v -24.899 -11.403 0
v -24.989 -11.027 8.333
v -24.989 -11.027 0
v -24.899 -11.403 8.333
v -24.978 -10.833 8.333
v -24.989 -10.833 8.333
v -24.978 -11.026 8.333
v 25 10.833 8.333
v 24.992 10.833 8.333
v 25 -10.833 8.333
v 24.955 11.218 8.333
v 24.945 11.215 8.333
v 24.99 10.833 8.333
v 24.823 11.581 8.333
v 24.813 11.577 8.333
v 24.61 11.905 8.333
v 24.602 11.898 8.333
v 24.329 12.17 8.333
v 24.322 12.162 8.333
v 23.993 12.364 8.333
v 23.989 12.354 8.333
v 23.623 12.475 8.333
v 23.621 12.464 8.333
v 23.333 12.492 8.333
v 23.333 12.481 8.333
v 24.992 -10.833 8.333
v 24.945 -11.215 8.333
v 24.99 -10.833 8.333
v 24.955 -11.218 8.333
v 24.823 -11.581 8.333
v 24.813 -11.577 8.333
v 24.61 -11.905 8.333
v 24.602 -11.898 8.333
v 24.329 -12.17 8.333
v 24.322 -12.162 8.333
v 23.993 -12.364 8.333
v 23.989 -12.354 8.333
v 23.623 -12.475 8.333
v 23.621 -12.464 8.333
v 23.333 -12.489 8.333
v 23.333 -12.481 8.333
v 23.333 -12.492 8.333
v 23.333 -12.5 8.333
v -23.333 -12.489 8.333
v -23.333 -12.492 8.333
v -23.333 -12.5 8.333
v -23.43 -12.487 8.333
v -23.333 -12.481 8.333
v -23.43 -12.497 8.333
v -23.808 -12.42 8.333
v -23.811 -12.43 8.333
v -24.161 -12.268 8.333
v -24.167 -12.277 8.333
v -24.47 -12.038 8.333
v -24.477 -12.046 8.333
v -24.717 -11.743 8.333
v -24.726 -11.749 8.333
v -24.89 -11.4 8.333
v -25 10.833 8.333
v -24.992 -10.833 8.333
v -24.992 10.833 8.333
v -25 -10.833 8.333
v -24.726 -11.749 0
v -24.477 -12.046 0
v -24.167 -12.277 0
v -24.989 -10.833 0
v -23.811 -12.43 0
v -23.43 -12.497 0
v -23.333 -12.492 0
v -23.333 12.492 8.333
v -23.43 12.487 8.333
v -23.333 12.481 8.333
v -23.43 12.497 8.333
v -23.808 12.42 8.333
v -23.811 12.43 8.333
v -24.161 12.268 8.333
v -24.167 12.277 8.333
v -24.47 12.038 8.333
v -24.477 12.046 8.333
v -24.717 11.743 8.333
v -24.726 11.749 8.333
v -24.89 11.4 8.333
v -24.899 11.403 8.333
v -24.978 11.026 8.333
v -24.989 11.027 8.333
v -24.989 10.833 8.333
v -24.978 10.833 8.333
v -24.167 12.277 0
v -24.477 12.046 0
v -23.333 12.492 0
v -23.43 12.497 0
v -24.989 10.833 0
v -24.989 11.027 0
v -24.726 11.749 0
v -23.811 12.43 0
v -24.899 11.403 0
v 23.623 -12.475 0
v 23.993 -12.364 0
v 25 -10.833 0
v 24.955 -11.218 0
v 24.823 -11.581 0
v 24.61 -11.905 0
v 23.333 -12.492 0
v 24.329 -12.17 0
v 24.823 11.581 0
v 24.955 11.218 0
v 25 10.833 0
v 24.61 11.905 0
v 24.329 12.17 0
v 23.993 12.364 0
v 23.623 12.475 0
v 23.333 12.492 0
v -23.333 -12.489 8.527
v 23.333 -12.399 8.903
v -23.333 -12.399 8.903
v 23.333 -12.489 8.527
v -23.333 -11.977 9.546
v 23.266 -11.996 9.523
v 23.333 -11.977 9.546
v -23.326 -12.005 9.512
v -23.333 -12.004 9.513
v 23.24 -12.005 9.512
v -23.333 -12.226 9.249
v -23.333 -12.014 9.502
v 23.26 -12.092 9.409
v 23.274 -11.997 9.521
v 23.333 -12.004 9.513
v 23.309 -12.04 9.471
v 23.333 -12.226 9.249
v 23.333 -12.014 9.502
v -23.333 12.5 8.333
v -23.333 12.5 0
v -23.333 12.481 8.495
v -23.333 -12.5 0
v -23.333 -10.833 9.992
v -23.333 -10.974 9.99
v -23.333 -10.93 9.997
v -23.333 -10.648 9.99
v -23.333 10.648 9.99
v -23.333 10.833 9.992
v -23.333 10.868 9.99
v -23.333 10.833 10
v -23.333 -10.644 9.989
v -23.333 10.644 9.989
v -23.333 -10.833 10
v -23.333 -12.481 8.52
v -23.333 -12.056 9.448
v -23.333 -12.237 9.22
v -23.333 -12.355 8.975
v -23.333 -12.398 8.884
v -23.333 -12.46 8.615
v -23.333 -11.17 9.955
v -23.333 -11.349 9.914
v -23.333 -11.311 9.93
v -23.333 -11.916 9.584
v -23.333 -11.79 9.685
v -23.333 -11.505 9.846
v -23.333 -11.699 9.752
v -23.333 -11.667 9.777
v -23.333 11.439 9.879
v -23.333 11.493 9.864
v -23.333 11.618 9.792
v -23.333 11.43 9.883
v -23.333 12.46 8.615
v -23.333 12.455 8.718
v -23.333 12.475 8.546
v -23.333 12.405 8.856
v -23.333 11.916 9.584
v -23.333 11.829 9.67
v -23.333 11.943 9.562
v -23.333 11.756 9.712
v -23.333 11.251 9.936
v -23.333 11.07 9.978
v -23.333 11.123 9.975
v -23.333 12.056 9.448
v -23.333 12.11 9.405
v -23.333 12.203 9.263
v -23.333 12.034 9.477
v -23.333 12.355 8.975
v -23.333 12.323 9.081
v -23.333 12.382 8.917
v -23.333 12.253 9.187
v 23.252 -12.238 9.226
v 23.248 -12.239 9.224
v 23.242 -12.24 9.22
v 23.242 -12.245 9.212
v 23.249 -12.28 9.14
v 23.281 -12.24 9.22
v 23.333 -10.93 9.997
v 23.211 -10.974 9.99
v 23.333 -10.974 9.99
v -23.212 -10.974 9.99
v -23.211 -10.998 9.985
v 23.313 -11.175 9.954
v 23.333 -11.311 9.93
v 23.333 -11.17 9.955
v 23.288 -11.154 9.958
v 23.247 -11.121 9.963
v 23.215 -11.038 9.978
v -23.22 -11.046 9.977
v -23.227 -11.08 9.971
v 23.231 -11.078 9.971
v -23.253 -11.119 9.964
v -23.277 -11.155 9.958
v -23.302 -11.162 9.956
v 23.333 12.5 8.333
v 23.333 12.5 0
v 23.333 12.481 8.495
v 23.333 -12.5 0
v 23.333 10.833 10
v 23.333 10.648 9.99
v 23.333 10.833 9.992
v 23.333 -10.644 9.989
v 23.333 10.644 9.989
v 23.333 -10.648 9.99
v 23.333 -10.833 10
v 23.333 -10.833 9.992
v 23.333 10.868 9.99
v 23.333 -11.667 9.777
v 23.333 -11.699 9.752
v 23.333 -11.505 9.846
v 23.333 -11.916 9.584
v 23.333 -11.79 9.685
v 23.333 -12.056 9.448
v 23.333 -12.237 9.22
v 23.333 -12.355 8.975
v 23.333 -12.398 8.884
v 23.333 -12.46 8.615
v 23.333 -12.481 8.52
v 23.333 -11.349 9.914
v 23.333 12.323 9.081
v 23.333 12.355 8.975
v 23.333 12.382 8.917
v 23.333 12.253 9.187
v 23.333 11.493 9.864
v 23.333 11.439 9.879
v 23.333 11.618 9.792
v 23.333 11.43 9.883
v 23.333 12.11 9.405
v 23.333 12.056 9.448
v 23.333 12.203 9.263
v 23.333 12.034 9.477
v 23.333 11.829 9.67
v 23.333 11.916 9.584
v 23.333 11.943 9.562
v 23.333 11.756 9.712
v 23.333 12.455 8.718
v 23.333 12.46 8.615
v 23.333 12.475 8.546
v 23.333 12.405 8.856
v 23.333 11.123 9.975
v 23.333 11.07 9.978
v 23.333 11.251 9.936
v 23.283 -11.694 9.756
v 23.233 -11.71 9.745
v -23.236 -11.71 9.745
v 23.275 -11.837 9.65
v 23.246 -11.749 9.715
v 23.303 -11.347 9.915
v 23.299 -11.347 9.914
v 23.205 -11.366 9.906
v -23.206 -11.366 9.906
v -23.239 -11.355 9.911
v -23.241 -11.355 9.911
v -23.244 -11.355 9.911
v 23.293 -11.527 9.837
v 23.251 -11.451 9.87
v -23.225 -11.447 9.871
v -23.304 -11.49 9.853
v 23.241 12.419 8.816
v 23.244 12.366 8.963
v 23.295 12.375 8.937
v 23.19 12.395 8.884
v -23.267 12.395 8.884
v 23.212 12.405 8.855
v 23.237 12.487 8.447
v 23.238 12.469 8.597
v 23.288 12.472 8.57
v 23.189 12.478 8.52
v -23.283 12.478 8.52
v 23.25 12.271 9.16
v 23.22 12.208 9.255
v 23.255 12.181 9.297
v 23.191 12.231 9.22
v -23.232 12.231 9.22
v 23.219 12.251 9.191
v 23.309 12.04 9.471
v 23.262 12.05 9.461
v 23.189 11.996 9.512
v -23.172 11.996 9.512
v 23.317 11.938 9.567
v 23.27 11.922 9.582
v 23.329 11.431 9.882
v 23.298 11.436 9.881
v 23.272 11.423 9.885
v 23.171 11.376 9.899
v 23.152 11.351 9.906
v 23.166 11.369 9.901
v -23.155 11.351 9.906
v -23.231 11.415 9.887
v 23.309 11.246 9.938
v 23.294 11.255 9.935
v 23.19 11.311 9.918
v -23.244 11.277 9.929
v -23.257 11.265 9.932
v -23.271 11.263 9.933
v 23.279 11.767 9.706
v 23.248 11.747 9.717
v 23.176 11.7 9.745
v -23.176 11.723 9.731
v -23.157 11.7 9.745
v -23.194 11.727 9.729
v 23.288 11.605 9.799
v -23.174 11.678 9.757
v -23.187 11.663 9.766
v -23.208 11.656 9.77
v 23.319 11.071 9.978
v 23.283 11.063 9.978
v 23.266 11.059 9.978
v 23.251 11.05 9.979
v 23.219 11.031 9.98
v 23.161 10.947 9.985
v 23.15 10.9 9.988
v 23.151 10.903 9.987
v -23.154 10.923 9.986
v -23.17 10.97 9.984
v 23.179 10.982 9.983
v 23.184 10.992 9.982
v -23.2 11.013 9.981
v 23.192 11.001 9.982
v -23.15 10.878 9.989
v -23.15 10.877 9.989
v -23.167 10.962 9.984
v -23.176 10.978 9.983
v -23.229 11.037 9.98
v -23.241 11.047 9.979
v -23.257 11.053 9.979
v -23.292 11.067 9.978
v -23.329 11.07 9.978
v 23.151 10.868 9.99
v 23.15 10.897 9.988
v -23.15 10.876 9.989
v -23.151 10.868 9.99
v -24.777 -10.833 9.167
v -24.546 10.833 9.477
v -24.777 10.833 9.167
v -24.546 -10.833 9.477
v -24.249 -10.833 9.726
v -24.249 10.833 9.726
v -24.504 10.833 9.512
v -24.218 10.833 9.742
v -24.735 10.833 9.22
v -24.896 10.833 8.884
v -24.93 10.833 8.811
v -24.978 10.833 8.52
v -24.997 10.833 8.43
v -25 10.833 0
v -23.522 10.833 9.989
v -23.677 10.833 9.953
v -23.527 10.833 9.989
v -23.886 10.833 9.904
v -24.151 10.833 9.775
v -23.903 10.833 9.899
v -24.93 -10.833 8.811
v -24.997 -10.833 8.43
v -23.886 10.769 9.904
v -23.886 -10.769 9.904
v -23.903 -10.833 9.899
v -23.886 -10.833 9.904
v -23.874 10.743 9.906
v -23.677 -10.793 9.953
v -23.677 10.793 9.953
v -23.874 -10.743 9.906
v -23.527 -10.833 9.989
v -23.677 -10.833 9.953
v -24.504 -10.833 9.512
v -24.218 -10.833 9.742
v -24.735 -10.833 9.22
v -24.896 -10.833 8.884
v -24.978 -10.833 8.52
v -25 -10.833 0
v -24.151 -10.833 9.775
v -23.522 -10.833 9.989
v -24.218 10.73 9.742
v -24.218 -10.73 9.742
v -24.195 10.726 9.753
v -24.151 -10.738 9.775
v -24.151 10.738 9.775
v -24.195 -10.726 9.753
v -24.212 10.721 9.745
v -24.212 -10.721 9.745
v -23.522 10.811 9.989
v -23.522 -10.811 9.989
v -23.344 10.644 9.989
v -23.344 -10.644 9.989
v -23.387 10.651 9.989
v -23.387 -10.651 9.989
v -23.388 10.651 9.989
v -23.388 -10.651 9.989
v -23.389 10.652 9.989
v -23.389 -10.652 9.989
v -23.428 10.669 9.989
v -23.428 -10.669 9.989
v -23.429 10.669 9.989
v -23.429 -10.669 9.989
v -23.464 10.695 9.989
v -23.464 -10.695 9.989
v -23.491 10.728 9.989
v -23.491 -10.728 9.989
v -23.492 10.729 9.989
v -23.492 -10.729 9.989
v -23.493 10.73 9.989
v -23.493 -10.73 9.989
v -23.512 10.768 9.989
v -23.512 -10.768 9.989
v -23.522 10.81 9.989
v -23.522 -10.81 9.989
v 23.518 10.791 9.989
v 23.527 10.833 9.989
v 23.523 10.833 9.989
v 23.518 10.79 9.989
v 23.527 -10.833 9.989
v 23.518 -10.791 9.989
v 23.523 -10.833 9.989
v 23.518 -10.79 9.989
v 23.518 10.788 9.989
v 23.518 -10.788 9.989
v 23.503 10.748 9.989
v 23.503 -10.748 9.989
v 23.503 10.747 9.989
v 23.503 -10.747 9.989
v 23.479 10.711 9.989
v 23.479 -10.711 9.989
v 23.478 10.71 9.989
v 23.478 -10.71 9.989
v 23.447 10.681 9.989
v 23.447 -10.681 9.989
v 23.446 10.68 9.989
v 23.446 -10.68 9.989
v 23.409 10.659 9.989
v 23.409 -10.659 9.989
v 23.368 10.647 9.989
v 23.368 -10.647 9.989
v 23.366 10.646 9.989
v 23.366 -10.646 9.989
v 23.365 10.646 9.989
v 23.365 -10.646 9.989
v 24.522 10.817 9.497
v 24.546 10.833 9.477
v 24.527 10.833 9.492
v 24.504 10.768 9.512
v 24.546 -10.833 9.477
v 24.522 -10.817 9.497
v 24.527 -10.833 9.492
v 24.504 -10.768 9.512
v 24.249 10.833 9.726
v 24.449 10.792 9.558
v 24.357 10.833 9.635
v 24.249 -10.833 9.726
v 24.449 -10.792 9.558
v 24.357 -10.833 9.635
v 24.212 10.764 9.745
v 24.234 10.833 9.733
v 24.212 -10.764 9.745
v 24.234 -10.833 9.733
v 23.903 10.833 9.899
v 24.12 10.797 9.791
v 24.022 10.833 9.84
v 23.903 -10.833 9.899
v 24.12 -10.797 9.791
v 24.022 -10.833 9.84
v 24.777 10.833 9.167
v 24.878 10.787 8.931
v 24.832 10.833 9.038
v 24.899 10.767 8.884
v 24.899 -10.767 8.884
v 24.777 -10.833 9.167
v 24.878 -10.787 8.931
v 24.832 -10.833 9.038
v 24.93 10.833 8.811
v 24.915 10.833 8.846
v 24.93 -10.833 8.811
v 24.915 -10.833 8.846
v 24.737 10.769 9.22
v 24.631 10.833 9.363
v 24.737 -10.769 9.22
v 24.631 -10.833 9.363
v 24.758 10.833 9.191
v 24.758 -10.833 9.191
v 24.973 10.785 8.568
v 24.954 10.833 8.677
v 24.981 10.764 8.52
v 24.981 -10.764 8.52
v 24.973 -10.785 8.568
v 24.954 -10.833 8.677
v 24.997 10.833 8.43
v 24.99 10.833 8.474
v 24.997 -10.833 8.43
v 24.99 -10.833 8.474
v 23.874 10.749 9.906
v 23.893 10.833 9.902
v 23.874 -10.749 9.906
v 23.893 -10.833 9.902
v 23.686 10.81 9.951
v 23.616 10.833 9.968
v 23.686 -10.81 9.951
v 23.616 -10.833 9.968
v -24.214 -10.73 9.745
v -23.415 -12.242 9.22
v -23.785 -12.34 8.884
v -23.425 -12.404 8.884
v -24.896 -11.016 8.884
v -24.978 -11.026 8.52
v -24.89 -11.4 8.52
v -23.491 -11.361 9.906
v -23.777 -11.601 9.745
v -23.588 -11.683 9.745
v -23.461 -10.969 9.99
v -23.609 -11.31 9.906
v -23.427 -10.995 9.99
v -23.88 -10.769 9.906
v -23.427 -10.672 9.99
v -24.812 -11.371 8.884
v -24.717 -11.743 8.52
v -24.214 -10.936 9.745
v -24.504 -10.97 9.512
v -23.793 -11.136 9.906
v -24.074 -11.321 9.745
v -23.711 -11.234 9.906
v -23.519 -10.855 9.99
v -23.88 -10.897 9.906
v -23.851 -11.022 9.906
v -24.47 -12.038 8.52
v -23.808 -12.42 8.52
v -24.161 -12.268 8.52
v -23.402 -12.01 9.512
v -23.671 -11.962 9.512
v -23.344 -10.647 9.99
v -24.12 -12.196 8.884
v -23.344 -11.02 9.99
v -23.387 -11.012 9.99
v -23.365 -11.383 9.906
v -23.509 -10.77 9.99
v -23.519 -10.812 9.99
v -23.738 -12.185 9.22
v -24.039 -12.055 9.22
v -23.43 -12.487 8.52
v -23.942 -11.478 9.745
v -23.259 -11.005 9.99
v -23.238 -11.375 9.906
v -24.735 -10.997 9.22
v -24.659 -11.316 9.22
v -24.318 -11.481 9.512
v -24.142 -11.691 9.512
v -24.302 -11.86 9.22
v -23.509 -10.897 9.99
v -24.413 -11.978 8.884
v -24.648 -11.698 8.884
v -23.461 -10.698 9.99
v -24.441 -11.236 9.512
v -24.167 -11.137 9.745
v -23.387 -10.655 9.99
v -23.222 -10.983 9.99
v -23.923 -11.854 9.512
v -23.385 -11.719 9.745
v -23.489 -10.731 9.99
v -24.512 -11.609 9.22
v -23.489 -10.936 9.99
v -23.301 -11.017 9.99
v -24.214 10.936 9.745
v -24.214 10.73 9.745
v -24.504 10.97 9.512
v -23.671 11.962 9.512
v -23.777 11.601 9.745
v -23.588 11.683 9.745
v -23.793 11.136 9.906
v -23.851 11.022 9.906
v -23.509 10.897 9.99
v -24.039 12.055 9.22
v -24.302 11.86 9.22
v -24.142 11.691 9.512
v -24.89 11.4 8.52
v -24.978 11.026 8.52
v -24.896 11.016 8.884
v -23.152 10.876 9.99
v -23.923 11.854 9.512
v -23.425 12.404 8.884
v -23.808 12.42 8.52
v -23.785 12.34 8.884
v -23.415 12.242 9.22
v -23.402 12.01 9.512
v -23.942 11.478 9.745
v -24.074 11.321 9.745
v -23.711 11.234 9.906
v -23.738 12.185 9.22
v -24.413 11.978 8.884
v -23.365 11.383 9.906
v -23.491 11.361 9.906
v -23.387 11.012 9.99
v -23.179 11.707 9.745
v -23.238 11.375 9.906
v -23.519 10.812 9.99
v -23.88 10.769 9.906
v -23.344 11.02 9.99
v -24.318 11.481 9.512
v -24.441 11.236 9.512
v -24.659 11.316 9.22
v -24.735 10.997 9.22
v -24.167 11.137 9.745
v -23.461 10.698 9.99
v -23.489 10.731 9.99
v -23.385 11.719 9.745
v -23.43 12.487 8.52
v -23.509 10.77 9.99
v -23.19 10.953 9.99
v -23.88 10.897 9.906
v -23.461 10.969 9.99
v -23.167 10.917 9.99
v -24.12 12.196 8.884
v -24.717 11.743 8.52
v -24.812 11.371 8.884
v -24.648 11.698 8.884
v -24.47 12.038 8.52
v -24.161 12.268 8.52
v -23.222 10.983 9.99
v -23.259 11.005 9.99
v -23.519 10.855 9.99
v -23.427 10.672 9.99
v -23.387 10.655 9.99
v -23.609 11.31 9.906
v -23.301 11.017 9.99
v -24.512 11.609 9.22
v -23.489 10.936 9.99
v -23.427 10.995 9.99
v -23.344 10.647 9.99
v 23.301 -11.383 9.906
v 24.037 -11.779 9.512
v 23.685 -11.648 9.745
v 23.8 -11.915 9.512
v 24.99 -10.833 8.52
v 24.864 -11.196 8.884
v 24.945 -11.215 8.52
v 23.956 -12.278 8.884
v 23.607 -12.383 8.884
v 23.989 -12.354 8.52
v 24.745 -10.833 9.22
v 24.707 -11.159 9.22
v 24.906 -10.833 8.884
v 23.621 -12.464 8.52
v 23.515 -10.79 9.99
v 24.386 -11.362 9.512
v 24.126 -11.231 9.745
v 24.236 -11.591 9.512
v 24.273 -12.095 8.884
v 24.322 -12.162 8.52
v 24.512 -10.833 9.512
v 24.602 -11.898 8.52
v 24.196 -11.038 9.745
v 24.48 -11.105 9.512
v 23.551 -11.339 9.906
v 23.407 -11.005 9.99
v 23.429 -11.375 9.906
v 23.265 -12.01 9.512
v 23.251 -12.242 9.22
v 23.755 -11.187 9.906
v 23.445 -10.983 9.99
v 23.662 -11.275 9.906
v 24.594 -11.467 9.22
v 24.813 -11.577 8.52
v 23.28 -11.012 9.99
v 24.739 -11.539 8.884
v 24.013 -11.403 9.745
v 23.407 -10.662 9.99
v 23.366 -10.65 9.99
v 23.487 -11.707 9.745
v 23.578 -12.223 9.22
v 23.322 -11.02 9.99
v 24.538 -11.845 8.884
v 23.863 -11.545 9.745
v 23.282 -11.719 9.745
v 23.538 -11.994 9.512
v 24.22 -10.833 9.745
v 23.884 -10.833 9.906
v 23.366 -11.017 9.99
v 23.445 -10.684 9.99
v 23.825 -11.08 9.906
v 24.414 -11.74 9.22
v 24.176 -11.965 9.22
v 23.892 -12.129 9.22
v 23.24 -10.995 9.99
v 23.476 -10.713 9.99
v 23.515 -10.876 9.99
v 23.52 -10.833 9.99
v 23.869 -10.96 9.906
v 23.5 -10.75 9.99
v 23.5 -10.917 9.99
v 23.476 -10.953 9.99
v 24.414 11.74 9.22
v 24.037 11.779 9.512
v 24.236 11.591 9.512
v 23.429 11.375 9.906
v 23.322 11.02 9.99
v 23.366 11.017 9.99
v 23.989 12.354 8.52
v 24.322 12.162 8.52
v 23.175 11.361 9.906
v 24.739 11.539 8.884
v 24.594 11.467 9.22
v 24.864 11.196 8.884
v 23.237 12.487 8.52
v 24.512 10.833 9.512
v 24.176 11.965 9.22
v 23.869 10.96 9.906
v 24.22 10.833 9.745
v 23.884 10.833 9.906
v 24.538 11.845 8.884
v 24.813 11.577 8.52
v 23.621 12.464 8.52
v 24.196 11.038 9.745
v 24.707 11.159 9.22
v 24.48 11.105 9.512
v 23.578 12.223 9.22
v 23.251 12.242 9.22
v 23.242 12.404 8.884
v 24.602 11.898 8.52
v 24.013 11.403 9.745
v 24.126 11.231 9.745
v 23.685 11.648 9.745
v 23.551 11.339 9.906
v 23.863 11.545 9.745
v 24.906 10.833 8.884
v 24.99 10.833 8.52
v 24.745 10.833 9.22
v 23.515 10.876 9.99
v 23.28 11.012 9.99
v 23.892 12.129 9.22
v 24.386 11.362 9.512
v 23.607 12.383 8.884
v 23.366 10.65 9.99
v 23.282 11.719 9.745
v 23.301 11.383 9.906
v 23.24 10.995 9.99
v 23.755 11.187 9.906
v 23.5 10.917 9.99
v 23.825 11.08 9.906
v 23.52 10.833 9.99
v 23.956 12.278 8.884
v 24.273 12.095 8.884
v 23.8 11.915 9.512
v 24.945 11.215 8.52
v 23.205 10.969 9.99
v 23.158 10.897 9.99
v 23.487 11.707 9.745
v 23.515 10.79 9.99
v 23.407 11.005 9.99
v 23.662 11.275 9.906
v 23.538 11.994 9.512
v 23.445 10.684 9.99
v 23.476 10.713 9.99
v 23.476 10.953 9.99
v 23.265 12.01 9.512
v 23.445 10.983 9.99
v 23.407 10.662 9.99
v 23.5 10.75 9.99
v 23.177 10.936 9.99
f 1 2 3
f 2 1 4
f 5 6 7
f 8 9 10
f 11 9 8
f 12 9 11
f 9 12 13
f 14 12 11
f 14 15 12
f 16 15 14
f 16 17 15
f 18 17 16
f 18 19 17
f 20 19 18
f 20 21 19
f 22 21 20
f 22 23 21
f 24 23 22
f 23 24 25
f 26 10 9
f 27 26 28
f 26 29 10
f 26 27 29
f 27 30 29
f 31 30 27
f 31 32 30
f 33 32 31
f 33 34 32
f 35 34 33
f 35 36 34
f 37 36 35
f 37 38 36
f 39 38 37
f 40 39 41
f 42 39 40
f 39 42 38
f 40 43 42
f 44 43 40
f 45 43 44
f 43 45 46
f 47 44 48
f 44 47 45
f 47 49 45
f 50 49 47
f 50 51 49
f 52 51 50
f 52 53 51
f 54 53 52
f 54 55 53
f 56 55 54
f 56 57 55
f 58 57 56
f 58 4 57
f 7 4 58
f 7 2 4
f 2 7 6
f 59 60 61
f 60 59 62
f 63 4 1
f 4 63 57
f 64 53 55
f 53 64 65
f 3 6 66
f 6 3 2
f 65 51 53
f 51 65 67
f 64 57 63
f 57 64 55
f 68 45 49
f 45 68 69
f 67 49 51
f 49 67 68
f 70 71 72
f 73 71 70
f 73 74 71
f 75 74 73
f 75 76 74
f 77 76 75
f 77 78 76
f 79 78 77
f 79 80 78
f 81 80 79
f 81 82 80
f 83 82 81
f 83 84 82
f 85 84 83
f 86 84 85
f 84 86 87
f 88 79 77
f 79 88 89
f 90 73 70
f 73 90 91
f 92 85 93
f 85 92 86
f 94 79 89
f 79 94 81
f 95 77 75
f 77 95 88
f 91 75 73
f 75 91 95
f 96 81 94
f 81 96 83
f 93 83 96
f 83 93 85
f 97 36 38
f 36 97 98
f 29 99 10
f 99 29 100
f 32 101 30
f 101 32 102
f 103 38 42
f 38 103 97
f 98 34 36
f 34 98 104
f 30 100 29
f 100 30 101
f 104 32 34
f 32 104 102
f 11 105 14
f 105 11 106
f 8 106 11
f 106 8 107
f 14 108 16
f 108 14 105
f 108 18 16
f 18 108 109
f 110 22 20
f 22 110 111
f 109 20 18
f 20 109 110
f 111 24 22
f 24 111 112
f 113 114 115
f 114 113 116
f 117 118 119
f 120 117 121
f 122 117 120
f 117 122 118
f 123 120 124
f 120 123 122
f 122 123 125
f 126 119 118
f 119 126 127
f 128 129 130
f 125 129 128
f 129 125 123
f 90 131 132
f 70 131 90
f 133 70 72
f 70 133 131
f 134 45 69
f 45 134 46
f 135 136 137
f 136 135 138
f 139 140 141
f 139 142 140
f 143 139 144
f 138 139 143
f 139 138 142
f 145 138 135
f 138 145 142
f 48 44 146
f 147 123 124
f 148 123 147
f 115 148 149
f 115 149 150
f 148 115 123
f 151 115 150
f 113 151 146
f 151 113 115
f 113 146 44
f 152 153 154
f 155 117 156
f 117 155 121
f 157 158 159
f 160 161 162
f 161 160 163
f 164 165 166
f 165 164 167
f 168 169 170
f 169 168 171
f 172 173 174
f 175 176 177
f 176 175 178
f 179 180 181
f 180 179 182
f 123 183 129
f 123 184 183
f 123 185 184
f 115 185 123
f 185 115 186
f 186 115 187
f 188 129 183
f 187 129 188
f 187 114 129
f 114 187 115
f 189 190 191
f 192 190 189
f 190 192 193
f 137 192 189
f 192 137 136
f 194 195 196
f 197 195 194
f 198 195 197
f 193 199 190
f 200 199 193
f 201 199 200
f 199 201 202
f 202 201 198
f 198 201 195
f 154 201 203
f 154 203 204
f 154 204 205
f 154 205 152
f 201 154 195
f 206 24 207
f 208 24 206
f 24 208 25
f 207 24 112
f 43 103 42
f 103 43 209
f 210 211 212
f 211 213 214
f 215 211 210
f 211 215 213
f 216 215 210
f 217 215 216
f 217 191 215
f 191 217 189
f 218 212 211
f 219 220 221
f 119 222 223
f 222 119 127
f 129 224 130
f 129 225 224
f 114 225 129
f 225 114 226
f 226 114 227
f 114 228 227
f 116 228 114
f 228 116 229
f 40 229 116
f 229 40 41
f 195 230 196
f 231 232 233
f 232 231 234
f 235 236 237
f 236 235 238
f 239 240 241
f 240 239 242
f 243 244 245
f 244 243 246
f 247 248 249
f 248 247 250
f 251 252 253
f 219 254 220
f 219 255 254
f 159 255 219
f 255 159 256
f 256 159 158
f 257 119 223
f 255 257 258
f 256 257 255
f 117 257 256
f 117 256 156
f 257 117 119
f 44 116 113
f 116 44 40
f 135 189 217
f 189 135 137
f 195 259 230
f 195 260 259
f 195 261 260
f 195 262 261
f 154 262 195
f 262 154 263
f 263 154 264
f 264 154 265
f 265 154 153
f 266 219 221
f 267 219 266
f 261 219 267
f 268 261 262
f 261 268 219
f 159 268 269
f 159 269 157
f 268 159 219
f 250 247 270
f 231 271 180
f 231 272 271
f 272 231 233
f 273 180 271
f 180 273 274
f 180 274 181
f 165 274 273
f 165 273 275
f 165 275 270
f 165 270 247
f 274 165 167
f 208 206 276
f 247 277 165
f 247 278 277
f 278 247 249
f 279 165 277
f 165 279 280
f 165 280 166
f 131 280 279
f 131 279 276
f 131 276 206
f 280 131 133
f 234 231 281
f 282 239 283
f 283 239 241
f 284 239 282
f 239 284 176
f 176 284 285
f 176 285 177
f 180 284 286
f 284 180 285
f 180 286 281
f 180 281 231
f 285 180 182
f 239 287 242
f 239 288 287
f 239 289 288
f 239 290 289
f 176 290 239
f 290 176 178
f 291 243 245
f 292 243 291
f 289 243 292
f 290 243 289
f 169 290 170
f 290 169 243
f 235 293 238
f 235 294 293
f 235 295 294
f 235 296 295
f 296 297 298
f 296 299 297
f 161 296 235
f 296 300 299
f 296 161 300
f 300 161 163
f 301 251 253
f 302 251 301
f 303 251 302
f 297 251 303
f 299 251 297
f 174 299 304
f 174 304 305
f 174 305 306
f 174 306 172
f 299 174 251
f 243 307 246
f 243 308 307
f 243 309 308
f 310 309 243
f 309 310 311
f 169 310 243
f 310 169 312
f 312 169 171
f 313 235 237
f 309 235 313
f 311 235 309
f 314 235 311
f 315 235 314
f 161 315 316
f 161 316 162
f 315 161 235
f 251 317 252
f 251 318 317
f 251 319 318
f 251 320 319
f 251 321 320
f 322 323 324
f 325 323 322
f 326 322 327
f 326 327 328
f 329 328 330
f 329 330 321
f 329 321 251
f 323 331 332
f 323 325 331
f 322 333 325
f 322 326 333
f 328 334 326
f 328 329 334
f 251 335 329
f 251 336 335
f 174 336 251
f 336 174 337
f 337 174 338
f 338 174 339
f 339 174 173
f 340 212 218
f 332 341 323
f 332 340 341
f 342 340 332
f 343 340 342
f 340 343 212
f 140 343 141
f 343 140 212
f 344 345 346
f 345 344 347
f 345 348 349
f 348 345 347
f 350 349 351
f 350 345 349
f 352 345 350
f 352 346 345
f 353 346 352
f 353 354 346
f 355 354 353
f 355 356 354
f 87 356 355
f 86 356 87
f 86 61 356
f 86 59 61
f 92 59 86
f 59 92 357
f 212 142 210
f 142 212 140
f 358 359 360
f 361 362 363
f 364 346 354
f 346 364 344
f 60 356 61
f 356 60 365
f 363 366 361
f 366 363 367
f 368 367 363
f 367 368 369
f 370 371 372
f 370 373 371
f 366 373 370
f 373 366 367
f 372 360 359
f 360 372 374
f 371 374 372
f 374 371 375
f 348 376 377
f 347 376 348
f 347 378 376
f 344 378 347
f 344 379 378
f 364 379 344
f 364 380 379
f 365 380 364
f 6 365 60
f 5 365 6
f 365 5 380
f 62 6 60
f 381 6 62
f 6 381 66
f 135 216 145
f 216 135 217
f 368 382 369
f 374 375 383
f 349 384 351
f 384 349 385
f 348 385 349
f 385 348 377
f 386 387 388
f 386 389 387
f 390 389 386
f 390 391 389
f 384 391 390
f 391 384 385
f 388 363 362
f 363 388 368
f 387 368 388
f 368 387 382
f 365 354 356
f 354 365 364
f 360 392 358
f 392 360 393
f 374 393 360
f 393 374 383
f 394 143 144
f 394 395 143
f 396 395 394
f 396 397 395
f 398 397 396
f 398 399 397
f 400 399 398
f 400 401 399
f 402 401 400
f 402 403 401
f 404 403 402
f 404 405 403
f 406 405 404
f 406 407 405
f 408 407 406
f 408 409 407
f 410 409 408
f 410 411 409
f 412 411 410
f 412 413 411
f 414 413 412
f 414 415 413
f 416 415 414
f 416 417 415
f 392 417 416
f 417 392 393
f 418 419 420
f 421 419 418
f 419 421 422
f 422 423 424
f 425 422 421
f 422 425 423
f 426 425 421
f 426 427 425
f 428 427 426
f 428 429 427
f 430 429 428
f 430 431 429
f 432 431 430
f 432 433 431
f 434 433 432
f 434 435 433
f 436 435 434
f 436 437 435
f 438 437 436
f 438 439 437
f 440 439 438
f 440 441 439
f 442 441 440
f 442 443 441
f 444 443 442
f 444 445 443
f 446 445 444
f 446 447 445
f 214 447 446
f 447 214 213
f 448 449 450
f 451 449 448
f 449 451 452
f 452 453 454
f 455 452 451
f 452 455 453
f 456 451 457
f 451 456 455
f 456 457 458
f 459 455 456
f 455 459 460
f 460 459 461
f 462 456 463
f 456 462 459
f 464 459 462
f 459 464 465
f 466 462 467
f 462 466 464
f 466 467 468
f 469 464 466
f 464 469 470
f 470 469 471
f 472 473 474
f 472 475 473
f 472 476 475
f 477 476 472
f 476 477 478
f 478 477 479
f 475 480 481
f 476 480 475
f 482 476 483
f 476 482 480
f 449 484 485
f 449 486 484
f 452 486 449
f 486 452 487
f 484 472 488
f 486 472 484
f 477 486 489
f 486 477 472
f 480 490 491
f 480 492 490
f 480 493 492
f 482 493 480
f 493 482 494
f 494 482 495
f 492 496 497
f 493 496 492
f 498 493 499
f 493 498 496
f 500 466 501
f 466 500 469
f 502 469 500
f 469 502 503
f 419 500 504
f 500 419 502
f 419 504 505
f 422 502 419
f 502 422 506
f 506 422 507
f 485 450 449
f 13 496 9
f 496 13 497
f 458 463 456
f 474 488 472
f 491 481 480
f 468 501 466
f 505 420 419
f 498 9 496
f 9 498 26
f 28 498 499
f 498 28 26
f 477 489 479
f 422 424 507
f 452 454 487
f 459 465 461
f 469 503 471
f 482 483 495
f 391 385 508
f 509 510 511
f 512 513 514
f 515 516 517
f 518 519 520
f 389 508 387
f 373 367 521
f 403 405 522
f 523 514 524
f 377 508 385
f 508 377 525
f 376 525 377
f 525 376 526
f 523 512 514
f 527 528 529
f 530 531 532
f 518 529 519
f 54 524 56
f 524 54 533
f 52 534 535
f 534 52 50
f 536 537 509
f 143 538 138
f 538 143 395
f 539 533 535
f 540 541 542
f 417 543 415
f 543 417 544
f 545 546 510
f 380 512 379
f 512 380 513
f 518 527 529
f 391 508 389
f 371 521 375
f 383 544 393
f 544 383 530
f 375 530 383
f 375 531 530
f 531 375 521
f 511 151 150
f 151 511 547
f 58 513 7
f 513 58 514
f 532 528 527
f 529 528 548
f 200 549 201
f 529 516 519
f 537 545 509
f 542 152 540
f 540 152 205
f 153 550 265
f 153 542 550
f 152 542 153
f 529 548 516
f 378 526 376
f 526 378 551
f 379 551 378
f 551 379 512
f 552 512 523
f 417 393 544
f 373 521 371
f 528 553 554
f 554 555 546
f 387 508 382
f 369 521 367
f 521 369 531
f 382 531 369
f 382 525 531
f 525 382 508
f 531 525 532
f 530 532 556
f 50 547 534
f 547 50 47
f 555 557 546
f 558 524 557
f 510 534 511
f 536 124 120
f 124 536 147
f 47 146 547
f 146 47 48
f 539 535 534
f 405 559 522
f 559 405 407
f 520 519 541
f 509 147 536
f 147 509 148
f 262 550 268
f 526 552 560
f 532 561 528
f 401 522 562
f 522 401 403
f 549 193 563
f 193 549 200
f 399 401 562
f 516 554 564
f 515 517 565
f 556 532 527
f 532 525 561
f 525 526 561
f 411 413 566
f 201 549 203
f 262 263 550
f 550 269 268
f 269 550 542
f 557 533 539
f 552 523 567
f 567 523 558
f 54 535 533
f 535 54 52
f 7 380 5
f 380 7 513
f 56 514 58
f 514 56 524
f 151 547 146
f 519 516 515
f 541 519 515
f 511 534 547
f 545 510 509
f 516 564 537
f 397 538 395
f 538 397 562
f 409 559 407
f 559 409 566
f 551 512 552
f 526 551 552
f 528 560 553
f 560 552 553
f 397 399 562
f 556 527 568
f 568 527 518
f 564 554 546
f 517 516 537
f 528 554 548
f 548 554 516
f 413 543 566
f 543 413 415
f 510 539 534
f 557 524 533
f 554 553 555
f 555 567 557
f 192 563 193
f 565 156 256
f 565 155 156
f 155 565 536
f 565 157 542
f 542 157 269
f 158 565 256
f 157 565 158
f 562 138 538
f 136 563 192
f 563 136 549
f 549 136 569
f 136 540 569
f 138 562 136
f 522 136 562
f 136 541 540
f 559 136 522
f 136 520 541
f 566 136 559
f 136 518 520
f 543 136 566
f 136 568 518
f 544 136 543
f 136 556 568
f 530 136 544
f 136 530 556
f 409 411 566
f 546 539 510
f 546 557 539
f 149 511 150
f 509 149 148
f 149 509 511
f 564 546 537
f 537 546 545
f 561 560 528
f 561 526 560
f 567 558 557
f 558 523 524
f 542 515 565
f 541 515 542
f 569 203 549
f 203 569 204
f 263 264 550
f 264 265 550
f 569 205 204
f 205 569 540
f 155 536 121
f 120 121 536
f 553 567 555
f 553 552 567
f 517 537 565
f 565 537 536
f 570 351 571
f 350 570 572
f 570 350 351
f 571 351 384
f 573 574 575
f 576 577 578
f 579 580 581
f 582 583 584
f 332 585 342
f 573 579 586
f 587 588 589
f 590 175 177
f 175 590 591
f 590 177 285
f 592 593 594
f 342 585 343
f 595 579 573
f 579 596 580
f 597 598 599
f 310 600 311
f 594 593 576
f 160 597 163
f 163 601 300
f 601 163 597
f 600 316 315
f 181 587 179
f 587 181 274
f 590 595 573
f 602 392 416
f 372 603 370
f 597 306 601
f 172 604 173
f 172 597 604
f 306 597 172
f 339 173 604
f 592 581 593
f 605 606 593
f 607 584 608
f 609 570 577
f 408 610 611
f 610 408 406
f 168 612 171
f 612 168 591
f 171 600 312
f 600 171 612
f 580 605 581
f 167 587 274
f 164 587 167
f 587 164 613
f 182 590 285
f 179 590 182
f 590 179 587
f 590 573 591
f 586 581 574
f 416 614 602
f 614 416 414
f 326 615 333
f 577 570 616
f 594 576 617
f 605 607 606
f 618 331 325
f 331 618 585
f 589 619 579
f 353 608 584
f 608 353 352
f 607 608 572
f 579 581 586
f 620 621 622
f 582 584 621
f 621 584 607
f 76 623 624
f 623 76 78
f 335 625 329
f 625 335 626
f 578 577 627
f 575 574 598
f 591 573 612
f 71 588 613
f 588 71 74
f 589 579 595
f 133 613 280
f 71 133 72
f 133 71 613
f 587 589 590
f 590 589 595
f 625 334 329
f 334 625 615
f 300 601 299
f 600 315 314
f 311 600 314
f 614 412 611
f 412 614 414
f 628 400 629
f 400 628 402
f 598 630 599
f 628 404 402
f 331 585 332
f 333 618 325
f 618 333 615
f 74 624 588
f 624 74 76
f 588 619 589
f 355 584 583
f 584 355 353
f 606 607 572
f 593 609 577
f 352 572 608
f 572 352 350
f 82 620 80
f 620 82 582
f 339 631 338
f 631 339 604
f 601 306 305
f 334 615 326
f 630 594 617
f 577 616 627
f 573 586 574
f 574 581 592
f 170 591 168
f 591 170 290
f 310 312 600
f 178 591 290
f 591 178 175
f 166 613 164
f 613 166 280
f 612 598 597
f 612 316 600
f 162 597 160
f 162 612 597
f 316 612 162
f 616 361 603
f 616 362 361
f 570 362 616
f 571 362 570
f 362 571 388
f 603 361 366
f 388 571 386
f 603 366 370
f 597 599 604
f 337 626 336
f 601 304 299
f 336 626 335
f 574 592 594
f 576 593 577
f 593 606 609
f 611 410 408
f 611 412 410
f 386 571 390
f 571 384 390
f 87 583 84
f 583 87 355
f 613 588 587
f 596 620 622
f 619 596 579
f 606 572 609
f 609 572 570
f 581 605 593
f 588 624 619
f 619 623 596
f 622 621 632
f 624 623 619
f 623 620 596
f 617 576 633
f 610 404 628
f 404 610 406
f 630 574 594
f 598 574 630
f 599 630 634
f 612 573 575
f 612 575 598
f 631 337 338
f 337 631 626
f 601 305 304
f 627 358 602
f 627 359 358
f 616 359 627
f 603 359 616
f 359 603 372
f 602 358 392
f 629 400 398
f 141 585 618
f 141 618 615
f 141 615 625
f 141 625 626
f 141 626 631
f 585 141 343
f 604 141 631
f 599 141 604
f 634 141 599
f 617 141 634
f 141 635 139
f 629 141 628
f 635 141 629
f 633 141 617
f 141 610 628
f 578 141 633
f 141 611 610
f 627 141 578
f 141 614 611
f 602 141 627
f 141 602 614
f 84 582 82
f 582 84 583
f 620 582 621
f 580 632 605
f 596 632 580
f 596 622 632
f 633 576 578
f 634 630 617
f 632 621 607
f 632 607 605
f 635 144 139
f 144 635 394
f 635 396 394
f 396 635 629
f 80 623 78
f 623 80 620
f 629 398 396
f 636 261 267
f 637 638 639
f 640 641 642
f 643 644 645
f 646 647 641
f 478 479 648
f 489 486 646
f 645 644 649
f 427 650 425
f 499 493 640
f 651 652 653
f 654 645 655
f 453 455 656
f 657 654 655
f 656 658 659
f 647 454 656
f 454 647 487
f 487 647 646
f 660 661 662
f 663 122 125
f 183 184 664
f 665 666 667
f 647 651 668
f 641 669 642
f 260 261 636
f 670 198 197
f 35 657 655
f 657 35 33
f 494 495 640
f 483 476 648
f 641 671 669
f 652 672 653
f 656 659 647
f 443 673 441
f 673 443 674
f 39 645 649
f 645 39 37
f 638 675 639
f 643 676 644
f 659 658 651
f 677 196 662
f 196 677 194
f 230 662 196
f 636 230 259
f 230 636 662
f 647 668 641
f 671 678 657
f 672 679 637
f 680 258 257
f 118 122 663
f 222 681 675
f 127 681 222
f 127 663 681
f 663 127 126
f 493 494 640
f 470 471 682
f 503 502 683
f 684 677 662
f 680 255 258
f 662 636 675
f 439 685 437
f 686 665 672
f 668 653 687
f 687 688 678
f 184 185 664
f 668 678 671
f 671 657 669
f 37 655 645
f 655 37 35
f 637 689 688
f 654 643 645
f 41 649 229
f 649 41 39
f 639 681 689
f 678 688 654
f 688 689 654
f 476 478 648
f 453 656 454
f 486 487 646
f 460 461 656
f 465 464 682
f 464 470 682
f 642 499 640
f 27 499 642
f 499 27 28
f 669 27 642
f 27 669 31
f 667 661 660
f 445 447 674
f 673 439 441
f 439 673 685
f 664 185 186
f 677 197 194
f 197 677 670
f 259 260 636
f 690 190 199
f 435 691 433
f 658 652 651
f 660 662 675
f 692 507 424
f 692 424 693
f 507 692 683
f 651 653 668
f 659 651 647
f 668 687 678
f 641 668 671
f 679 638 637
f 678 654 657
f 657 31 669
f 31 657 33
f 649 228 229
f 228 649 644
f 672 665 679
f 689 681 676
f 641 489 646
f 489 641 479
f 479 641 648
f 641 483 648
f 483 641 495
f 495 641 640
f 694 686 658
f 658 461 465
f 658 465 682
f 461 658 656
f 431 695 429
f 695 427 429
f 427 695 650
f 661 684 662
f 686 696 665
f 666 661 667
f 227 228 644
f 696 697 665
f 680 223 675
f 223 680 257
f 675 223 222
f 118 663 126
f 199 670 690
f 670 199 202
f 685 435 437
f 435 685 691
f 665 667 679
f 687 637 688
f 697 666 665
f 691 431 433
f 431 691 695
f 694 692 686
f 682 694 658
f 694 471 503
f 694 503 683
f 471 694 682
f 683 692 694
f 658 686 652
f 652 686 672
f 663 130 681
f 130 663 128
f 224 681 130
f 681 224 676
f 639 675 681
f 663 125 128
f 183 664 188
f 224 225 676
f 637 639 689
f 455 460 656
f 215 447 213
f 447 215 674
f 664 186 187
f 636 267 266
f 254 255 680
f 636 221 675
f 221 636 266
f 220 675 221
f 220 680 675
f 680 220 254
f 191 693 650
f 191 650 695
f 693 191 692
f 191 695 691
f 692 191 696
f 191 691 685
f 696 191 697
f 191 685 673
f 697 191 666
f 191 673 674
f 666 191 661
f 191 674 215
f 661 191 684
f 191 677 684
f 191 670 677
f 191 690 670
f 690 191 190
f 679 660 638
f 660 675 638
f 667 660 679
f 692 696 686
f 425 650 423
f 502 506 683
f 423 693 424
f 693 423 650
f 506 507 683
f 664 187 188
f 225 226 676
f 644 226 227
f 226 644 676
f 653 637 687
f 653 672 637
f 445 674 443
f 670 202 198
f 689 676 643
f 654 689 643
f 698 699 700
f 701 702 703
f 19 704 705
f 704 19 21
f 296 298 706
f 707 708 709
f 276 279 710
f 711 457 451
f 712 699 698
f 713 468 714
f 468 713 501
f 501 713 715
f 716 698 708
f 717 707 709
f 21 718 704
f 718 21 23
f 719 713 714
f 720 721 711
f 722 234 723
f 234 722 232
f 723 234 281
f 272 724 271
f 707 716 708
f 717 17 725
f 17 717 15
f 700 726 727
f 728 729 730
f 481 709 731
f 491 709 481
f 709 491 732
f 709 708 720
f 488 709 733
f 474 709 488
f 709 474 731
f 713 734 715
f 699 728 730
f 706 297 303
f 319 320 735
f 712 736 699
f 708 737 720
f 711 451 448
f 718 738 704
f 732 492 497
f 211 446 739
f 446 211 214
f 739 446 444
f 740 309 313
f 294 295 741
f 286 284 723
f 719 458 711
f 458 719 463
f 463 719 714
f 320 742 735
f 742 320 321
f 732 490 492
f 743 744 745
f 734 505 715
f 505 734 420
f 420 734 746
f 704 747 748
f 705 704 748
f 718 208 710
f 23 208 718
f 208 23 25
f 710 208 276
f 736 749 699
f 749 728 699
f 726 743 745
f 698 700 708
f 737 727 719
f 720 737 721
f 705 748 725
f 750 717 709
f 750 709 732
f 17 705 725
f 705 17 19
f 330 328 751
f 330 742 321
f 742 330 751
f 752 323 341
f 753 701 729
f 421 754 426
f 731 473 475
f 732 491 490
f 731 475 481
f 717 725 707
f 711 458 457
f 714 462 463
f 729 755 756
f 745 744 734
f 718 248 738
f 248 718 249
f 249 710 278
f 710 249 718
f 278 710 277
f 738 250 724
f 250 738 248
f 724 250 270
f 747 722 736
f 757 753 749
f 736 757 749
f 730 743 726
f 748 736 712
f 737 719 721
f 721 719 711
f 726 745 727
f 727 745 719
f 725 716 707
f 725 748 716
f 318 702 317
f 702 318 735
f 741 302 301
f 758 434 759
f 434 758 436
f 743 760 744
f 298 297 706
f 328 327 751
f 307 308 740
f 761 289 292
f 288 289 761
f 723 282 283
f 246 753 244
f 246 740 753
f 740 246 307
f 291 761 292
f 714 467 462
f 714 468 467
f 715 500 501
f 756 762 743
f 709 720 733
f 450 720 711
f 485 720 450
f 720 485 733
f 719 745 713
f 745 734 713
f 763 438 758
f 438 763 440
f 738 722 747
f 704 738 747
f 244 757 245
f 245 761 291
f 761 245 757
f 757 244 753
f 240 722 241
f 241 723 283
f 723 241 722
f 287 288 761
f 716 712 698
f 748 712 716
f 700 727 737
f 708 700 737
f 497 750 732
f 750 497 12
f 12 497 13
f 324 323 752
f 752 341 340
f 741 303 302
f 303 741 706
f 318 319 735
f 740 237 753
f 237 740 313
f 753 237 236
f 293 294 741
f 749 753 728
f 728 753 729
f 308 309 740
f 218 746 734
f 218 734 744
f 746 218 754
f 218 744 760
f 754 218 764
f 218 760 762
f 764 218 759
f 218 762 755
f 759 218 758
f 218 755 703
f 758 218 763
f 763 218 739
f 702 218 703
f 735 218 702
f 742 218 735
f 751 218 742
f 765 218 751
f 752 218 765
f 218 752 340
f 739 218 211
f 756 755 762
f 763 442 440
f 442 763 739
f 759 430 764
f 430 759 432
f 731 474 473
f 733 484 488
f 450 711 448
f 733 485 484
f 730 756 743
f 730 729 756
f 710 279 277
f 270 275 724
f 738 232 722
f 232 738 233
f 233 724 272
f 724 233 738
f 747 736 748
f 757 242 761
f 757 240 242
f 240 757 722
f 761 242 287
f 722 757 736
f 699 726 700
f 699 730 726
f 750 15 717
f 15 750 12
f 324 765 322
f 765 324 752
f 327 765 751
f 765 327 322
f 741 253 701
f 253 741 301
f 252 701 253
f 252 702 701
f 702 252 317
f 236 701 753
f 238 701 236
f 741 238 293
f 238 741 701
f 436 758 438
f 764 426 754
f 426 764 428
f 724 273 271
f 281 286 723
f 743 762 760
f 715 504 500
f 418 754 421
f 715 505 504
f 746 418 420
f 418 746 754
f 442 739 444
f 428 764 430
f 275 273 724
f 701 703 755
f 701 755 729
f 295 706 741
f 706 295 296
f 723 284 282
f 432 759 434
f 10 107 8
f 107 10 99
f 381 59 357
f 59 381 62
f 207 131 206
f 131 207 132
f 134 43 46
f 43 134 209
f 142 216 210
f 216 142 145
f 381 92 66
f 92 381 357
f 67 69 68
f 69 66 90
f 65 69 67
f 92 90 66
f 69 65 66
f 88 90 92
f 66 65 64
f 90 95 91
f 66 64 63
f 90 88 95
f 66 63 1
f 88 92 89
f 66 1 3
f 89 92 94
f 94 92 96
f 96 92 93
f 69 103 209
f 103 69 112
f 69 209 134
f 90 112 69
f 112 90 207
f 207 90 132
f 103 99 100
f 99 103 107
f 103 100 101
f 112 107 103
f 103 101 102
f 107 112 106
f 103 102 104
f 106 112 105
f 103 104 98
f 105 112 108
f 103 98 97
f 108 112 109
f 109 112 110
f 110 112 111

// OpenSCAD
use <MCAD/boxes.scad>
$fa=1;
$fs=0.4;

module drive_motor_foot(pad_width=50, pad_length=25, pad_height=10) {
    union() {
        translate([0,0,pad_height/2])
            roundedBox(size=[pad_width,pad_length,pad_height],radius=pad_height/6,sidesonly=false);
        translate([0,0,pad_height/2 - pad_height/4])
            roundedBox(size=[pad_width,pad_length,pad_height/2],radius=pad_height/6,sidesonly=true);
        
    }
}
drive_motor_foot();
